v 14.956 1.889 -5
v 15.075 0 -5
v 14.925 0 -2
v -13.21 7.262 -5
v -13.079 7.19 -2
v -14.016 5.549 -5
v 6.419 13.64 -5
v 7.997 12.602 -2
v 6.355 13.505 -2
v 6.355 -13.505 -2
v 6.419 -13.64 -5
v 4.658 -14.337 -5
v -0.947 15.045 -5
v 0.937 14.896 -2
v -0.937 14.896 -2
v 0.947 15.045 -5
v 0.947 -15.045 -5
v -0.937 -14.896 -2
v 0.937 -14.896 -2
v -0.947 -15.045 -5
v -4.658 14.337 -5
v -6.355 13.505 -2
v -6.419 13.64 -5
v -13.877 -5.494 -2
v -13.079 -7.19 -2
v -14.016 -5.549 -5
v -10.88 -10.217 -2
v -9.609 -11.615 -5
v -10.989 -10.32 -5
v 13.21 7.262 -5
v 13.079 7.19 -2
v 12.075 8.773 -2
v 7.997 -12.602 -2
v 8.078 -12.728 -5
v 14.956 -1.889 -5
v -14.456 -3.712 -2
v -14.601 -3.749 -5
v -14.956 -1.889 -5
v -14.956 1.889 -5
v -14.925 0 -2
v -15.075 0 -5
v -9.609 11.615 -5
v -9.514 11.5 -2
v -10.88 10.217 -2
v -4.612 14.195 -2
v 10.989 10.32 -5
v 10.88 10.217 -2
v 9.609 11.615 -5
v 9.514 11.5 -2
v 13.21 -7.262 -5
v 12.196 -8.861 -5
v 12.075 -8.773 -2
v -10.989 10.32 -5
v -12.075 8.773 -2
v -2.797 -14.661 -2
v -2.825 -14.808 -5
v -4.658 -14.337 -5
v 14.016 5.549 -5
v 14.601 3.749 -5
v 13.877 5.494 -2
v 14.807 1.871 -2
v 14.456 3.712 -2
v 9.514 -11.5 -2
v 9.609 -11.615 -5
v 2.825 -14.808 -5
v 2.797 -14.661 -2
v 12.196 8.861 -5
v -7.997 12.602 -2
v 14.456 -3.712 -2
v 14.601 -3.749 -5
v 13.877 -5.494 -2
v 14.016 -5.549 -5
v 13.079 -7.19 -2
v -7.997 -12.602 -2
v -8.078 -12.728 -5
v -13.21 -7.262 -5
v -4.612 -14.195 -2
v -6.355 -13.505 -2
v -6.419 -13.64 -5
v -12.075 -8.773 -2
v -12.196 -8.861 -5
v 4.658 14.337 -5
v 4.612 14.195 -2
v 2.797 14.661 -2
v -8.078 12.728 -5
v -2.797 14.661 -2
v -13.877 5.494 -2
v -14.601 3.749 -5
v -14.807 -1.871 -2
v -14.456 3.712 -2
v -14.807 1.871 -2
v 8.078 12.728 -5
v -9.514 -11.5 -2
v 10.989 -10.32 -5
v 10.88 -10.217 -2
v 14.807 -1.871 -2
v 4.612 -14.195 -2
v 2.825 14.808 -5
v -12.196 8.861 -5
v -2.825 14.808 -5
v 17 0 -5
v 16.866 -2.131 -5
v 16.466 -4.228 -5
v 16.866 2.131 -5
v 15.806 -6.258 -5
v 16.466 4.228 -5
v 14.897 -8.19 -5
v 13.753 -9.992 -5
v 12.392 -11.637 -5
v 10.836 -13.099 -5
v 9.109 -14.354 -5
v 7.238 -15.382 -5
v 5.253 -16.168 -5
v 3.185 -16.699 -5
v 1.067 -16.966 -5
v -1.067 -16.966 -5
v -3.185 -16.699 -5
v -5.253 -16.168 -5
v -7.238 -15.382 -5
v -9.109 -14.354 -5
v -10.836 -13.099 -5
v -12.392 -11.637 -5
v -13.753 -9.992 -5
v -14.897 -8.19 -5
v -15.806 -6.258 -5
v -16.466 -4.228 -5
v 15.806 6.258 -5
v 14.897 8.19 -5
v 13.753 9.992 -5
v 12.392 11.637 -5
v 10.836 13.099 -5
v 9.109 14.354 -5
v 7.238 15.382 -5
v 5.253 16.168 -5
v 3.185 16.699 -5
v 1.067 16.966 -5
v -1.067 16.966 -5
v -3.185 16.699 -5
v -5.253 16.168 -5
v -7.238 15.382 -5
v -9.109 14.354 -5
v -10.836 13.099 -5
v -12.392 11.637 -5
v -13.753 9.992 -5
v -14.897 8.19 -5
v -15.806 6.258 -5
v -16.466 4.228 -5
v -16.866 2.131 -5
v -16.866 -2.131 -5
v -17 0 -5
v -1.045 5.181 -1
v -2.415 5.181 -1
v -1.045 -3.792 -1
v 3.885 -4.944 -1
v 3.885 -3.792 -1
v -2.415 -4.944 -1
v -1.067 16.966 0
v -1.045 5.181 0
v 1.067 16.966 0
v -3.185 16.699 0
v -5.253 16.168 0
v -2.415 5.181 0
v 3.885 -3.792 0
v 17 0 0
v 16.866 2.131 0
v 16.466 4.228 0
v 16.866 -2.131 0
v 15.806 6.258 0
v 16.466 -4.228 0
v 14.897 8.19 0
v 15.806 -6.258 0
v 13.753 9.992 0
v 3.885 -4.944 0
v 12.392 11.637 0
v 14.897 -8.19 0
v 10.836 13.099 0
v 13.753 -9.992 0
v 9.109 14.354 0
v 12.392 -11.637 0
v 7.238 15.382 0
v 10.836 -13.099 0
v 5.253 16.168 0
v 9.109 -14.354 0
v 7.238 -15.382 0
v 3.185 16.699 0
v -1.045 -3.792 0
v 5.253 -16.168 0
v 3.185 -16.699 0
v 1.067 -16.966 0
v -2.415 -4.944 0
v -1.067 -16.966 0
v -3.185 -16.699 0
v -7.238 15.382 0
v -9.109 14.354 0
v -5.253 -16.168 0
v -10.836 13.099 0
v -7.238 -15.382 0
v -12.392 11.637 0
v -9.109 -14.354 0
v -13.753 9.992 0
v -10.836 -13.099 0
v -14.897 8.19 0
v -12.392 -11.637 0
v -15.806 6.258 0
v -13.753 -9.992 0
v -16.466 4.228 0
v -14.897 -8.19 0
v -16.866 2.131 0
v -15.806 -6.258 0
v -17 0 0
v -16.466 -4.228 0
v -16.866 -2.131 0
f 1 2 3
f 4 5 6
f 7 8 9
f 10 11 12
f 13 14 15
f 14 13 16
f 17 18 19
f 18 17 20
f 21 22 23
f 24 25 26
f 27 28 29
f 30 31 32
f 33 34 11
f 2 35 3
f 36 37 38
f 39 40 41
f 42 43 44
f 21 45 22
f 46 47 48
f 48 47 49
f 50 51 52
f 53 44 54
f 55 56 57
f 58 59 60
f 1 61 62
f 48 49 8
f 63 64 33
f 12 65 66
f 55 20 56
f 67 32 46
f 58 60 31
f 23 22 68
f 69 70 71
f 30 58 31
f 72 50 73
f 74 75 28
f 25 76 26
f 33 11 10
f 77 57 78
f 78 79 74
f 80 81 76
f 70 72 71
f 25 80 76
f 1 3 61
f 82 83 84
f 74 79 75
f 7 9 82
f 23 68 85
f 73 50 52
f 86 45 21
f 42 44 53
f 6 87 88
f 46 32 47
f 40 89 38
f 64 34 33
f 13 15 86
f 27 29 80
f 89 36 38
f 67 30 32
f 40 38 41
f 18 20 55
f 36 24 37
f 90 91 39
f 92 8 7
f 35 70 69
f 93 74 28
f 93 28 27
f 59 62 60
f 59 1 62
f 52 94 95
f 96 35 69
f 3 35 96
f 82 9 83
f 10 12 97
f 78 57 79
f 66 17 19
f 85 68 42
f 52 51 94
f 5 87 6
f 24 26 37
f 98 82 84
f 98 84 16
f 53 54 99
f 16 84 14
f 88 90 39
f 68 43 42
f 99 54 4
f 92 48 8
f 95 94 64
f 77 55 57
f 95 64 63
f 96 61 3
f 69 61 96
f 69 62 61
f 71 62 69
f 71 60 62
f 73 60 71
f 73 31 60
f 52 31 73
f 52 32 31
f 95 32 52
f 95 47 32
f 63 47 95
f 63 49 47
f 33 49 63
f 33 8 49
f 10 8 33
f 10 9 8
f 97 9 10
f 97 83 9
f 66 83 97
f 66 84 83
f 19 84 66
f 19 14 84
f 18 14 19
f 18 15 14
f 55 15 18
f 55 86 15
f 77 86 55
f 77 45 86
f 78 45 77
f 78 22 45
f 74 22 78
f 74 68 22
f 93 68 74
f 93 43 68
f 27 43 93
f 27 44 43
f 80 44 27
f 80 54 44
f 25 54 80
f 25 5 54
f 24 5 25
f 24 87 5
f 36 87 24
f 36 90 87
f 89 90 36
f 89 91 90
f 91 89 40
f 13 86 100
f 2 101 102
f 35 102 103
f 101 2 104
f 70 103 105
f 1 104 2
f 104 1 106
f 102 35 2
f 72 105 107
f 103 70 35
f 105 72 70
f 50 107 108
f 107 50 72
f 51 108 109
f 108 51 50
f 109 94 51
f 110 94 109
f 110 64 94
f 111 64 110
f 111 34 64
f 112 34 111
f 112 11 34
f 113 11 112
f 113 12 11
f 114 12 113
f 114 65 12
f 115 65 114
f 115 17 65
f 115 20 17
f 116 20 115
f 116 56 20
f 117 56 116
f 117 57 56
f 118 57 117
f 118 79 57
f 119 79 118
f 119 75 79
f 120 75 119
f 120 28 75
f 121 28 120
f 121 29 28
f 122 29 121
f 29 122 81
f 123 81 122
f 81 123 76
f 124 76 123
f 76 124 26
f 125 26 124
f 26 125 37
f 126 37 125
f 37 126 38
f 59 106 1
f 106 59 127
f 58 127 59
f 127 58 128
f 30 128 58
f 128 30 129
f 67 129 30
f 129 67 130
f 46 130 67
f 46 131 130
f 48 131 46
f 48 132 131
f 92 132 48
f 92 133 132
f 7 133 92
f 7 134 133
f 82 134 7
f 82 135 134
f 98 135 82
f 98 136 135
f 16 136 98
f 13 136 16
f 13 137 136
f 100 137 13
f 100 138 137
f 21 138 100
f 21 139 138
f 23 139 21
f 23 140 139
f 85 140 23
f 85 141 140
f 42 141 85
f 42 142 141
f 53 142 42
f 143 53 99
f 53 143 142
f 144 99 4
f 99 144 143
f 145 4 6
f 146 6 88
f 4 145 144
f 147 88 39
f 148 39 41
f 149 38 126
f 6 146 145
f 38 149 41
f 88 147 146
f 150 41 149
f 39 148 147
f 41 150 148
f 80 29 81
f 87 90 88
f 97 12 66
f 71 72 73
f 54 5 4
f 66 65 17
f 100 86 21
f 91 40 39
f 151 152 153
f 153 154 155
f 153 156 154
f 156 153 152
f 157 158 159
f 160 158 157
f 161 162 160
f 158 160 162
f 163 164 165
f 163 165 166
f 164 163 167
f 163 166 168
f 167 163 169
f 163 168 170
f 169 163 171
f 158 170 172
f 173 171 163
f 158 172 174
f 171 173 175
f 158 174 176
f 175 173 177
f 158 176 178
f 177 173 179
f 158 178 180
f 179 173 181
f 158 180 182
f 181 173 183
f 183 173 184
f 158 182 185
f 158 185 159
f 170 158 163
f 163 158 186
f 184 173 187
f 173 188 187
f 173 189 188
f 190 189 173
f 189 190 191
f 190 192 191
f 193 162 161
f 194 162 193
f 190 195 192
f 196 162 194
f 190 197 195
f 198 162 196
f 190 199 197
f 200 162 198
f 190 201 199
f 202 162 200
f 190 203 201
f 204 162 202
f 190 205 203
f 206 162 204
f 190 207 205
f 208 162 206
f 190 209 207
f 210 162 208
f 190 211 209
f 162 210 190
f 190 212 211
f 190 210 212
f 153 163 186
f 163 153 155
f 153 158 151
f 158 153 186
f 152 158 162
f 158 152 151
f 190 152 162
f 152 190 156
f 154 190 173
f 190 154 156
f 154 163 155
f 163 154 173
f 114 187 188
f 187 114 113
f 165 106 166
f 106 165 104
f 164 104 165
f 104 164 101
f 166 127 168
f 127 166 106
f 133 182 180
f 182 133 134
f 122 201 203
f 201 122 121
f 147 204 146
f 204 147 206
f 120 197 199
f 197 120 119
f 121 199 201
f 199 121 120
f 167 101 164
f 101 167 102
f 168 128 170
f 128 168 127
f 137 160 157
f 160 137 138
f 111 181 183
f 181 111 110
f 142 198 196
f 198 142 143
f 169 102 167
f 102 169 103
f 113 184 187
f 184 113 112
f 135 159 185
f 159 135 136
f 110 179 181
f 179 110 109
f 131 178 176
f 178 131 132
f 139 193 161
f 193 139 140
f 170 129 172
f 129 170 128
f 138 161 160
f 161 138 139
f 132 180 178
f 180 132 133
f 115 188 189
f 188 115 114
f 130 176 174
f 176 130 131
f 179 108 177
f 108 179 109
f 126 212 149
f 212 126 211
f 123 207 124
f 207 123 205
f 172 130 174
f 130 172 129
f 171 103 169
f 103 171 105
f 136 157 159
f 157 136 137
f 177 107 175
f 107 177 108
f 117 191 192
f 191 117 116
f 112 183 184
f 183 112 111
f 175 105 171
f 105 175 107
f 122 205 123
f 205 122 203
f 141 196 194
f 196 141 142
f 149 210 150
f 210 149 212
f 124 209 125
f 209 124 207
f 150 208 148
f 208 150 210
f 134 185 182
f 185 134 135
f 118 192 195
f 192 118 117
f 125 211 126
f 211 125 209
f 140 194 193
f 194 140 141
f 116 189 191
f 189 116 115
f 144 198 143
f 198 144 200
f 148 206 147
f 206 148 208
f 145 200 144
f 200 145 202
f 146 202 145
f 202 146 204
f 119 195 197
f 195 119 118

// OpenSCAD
$fn = 50;

difference() {
	union() {
		translate(v = [0, 0, -5.0]) {
			cylinder(h = 5, r = 17.0);
		}
	}
	union() {
		#translate(v = [0, 0, -5.0]) {
			cylinder(h = 3, r1 = 15.075, r2 = 14.925);
		}
		translate(v = [0, 0, -1]) {
			linear_extrude(height = 1) {
				text(font = "Impact", halign = "center", size = 10, text = "L", valign = "center");
			}
		}
	}
}
